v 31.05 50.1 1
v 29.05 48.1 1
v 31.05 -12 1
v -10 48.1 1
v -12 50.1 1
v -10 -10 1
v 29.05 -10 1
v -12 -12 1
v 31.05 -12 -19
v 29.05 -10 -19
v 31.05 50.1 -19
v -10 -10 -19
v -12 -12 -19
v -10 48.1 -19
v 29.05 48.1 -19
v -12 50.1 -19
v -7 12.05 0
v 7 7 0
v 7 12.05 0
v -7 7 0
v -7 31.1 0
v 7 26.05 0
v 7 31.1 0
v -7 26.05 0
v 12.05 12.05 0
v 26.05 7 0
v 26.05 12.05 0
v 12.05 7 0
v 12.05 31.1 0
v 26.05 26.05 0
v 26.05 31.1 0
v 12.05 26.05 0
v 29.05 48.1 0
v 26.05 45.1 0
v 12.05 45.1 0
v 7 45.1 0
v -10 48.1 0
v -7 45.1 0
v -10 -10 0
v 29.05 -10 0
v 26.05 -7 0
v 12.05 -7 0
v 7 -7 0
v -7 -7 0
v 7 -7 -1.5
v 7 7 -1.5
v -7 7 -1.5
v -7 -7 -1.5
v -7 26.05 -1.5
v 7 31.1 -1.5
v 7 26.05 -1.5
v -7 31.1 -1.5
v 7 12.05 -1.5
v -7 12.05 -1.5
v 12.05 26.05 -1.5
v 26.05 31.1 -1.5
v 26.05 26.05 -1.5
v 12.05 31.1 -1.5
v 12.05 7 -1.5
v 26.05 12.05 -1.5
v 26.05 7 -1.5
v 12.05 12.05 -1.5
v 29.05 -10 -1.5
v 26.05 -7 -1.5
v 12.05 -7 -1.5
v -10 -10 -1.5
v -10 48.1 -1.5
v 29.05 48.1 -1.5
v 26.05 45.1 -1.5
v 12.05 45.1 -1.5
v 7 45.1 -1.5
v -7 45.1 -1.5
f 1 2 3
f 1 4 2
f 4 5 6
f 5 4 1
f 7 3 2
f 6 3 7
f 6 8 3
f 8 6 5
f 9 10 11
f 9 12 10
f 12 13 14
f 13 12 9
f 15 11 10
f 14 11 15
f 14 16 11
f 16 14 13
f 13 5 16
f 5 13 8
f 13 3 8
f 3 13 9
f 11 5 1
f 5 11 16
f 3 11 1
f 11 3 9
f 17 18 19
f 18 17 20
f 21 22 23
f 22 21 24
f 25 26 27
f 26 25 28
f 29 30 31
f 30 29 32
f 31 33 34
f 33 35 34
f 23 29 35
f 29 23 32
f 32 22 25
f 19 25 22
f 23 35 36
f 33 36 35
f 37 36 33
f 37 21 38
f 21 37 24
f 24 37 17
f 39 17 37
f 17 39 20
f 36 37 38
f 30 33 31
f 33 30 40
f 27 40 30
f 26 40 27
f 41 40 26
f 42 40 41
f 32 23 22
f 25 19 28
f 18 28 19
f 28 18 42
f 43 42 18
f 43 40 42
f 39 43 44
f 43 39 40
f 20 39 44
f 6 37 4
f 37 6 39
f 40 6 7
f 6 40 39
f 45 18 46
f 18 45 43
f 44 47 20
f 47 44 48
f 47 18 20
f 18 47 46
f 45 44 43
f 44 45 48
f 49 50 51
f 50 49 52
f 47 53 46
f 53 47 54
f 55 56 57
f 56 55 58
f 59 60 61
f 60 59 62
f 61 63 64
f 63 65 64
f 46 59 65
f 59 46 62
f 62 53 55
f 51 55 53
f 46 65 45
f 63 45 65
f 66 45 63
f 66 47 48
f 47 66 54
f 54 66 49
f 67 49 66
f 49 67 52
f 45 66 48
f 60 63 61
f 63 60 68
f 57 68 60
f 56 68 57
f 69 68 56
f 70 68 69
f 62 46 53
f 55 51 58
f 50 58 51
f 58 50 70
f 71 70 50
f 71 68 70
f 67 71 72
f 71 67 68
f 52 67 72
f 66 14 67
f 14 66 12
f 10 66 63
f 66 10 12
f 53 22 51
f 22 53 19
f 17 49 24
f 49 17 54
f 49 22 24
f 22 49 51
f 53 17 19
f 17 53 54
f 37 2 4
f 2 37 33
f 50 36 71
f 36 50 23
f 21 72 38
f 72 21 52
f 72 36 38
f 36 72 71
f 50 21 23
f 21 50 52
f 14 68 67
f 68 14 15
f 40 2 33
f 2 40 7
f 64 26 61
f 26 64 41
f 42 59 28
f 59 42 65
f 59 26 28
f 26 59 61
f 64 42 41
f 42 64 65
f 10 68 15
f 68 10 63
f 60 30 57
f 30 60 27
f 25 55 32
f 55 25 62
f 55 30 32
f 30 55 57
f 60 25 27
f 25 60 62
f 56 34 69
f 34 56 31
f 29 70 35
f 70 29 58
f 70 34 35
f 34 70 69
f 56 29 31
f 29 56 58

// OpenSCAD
// Generated by SolidPython 1.1.3 on 2024-12-14 22:49:18


difference() {
	union() {
		translate(v = [0.0000000000, 0.0000000000, 0]) {
			translate(v = [-12, -12, -19]) {
				cube(size = [24, 24, 20]);
			}
		}
		translate(v = [0.0000000000, 19.0500000000, 0]) {
			translate(v = [-12, -12, -19]) {
				cube(size = [24, 24, 20]);
			}
		}
		translate(v = [0.0000000000, 38.1000000000, 0]) {
			translate(v = [-12, -12, -19]) {
				cube(size = [24, 24, 20]);
			}
		}
		translate(v = [19.0500000000, 0.0000000000, 0]) {
			translate(v = [-12, -12, -19]) {
				cube(size = [24, 24, 20]);
			}
		}
		translate(v = [19.0500000000, 19.0500000000, 0]) {
			translate(v = [-12, -12, -19]) {
				cube(size = [24, 24, 20]);
			}
		}
		translate(v = [19.0500000000, 38.1000000000, 0]) {
			translate(v = [-12, -12, -19]) {
				cube(size = [24, 24, 20]);
			}
		}
	}
	union() {
		translate(v = [0.0000000000, 0.0000000000, 0]) {
			union() {
				translate(v = [-10, -10, 0]) {
					cube(size = [20, 20, 10]);
				}
				translate(v = [-7, -7, -49]) {
					cube(size = [14, 14, 50]);
				}
				translate(v = [-10, -10, -51.5000000000]) {
					cube(size = [20, 20, 50]);
				}
			}
		}
		translate(v = [0.0000000000, 19.0500000000, 0]) {
			union() {
				translate(v = [-10, -10, 0]) {
					cube(size = [20, 20, 10]);
				}
				translate(v = [-7, -7, -49]) {
					cube(size = [14, 14, 50]);
				}
				translate(v = [-10, -10, -51.5000000000]) {
					cube(size = [20, 20, 50]);
				}
			}
		}
		translate(v = [0.0000000000, 38.1000000000, 0]) {
			union() {
				translate(v = [-10, -10, 0]) {
					cube(size = [20, 20, 10]);
				}
				translate(v = [-7, -7, -49]) {
					cube(size = [14, 14, 50]);
				}
				translate(v = [-10, -10, -51.5000000000]) {
					cube(size = [20, 20, 50]);
				}
			}
		}
		translate(v = [19.0500000000, 0.0000000000, 0]) {
			union() {
				translate(v = [-10, -10, 0]) {
					cube(size = [20, 20, 10]);
				}
				translate(v = [-7, -7, -49]) {
					cube(size = [14, 14, 50]);
				}
				translate(v = [-10, -10, -51.5000000000]) {
					cube(size = [20, 20, 50]);
				}
			}
		}
		translate(v = [19.0500000000, 19.0500000000, 0]) {
			union() {
				translate(v = [-10, -10, 0]) {
					cube(size = [20, 20, 10]);
				}
				translate(v = [-7, -7, -49]) {
					cube(size = [14, 14, 50]);
				}
				translate(v = [-10, -10, -51.5000000000]) {
					cube(size = [20, 20, 50]);
				}
			}
		}
		translate(v = [19.0500000000, 38.1000000000, 0]) {
			union() {
				translate(v = [-10, -10, 0]) {
					cube(size = [20, 20, 10]);
				}
				translate(v = [-7, -7, -49]) {
					cube(size = [14, 14, 50]);
				}
				translate(v = [-10, -10, -51.5000000000]) {
					cube(size = [20, 20, 50]);
				}
			}
		}
	}
}
/***********************************************
*********      SolidPython code:      **********
************************************************
 
from solid import *

# ケースになる部分
body = translate([-12, -12, -19])(
    cube([24, 24, 20])
)

# ケースからカットする部分
hole = union()(
    # スイッチの上側をカットする部分
    translate([-10, -10, 0])(
        cube([20, 20, 10])
    ),
    # スイッチの穴
    translate([-7, -7, -49])(
        cube([14, 14, 50])
    ),
    # スイッチプレートの下側
    translate([-10, -10, -51.5])(
        cube([20, 20, 50])
    ),
)

position = [
    [19.05 * 0, 19.05 * 0],
    [19.05 * 0, 19.05 * 1],
    [19.05 * 0, 19.05 * 2],
    [19.05 * 1, 19.05 * 0],
    [19.05 * 1, 19.05 * 1],
    [19.05 * 1, 19.05 * 2],
]

body6 = union()(
    [translate([x, y, 0])(body) for x, y in position]
)

hole6 = union()(
    [translate([x, y, 0])(hole) for x, y in position]
)

kbd = difference()(
  body6,
  hole6
)

scad_render_to_file(kbd, '5_6keys-2.scad')
 
 
************************************************/
